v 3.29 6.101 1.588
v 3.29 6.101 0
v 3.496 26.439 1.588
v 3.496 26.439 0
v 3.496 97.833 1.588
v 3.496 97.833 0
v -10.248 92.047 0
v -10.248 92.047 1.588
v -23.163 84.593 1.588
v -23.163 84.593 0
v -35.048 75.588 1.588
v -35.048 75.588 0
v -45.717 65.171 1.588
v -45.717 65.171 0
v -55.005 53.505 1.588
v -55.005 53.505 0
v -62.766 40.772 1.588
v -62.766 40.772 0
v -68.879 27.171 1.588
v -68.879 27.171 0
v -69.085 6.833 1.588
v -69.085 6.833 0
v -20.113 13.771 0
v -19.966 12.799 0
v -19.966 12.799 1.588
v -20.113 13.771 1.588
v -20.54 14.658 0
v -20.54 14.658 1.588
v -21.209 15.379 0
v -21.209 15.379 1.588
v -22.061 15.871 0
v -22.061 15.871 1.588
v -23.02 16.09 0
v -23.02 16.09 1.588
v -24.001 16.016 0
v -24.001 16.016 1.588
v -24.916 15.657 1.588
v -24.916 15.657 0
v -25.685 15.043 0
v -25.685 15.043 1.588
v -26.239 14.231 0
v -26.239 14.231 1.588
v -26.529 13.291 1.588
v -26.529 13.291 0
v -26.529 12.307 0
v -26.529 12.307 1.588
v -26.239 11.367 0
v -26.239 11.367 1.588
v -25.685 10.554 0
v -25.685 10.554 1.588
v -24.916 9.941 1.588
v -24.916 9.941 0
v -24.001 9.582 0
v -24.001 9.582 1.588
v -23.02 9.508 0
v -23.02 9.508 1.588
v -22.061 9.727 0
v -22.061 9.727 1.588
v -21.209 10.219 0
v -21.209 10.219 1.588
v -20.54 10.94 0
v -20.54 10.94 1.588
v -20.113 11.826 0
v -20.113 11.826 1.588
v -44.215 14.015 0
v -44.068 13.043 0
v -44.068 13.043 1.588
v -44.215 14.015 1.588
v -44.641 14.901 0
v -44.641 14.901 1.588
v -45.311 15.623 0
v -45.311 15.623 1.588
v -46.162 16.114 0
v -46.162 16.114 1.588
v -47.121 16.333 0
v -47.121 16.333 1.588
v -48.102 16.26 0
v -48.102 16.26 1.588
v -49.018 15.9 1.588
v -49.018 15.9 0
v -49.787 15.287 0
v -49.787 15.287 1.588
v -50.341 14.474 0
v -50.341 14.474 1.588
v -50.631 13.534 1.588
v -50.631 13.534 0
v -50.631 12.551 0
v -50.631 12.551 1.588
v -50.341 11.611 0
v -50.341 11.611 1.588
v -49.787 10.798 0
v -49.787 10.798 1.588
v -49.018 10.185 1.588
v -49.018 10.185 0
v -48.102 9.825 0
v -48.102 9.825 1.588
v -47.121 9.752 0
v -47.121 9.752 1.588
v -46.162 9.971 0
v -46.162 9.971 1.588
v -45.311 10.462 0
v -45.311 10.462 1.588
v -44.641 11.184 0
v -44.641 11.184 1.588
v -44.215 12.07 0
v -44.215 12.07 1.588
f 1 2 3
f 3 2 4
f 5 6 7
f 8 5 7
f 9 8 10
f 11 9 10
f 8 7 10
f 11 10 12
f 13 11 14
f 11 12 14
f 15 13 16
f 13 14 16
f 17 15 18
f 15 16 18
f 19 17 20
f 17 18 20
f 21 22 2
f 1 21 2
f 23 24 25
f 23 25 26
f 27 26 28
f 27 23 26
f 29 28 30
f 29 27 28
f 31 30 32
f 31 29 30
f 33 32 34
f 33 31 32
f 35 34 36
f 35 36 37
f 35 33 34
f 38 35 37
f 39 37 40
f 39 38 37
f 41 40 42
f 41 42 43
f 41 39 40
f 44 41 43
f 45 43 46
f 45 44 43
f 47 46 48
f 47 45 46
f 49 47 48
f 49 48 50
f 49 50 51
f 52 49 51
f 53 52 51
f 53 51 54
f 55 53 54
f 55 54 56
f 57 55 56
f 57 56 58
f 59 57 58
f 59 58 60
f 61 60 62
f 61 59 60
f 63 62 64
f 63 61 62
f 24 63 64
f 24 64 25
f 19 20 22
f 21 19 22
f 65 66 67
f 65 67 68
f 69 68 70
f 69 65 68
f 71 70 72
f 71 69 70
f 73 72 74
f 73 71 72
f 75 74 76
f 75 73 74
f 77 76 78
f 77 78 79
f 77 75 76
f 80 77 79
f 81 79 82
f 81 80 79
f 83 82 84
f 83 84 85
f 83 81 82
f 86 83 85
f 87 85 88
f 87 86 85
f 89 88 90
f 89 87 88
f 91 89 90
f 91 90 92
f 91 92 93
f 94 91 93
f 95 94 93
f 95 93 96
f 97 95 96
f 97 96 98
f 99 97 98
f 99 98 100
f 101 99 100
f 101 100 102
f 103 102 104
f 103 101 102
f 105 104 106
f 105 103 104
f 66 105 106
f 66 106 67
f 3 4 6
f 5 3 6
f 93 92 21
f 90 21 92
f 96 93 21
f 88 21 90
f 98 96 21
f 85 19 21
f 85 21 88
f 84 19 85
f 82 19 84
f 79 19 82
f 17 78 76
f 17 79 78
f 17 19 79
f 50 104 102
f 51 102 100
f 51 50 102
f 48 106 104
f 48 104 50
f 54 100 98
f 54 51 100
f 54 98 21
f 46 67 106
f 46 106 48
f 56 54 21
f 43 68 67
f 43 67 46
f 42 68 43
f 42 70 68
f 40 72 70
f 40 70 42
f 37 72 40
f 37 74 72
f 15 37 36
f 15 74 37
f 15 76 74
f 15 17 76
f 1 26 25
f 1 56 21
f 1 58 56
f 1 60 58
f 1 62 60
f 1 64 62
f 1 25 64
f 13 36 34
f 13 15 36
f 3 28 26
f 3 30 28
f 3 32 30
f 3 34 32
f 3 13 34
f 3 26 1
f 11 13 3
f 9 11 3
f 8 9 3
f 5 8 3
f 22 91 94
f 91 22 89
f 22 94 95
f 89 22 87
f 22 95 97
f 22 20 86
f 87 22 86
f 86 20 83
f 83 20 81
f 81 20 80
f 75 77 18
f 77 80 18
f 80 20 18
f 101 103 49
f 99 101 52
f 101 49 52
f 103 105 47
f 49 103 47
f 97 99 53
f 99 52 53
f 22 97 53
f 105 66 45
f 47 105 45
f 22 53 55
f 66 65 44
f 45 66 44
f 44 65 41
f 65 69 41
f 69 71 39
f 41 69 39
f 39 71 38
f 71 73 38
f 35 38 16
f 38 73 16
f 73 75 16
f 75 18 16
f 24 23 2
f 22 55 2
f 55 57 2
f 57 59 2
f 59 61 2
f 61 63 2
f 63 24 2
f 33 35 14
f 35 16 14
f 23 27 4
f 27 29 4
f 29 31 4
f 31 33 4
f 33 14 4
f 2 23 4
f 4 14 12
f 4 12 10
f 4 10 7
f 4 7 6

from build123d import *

# Parameters (mm, degrees)
SKETCH1_R           = 3.3
BOSS_EXTRUDE1_DEPTH = 1.5875


with BuildPart() as part:
    # Sketch1 → Boss-Extrude1 (new body)
    with BuildSketch(Plane.XY):
        with BuildLine():
            Line((-68.878774348, 27.170828826), (-69.084500488, 6.833319702))
            Line((-69.084500488, 6.833319702), (3.290042353, 6.101207661))
            Line((3.290042353, 6.101207661), (3.495768493, 26.438716786))
            Line((3.495768493, 26.438716786), (3.495768493, 97.832907794))
            ThreePointArc((3.495768493, 97.832907794), (-40.545204811, 70.545901145), (-68.878774348, 27.170828826))
        make_face()
        with Locations((-47.368063171, 13.042538508)):
            Circle(SKETCH1_R, mode=Mode.SUBTRACT)
        with Locations((-23.266255505, 12.798764706)):
            Circle(SKETCH1_R, mode=Mode.SUBTRACT)
    extrude(amount=BOSS_EXTRUDE1_DEPTH)


solid = part.part
